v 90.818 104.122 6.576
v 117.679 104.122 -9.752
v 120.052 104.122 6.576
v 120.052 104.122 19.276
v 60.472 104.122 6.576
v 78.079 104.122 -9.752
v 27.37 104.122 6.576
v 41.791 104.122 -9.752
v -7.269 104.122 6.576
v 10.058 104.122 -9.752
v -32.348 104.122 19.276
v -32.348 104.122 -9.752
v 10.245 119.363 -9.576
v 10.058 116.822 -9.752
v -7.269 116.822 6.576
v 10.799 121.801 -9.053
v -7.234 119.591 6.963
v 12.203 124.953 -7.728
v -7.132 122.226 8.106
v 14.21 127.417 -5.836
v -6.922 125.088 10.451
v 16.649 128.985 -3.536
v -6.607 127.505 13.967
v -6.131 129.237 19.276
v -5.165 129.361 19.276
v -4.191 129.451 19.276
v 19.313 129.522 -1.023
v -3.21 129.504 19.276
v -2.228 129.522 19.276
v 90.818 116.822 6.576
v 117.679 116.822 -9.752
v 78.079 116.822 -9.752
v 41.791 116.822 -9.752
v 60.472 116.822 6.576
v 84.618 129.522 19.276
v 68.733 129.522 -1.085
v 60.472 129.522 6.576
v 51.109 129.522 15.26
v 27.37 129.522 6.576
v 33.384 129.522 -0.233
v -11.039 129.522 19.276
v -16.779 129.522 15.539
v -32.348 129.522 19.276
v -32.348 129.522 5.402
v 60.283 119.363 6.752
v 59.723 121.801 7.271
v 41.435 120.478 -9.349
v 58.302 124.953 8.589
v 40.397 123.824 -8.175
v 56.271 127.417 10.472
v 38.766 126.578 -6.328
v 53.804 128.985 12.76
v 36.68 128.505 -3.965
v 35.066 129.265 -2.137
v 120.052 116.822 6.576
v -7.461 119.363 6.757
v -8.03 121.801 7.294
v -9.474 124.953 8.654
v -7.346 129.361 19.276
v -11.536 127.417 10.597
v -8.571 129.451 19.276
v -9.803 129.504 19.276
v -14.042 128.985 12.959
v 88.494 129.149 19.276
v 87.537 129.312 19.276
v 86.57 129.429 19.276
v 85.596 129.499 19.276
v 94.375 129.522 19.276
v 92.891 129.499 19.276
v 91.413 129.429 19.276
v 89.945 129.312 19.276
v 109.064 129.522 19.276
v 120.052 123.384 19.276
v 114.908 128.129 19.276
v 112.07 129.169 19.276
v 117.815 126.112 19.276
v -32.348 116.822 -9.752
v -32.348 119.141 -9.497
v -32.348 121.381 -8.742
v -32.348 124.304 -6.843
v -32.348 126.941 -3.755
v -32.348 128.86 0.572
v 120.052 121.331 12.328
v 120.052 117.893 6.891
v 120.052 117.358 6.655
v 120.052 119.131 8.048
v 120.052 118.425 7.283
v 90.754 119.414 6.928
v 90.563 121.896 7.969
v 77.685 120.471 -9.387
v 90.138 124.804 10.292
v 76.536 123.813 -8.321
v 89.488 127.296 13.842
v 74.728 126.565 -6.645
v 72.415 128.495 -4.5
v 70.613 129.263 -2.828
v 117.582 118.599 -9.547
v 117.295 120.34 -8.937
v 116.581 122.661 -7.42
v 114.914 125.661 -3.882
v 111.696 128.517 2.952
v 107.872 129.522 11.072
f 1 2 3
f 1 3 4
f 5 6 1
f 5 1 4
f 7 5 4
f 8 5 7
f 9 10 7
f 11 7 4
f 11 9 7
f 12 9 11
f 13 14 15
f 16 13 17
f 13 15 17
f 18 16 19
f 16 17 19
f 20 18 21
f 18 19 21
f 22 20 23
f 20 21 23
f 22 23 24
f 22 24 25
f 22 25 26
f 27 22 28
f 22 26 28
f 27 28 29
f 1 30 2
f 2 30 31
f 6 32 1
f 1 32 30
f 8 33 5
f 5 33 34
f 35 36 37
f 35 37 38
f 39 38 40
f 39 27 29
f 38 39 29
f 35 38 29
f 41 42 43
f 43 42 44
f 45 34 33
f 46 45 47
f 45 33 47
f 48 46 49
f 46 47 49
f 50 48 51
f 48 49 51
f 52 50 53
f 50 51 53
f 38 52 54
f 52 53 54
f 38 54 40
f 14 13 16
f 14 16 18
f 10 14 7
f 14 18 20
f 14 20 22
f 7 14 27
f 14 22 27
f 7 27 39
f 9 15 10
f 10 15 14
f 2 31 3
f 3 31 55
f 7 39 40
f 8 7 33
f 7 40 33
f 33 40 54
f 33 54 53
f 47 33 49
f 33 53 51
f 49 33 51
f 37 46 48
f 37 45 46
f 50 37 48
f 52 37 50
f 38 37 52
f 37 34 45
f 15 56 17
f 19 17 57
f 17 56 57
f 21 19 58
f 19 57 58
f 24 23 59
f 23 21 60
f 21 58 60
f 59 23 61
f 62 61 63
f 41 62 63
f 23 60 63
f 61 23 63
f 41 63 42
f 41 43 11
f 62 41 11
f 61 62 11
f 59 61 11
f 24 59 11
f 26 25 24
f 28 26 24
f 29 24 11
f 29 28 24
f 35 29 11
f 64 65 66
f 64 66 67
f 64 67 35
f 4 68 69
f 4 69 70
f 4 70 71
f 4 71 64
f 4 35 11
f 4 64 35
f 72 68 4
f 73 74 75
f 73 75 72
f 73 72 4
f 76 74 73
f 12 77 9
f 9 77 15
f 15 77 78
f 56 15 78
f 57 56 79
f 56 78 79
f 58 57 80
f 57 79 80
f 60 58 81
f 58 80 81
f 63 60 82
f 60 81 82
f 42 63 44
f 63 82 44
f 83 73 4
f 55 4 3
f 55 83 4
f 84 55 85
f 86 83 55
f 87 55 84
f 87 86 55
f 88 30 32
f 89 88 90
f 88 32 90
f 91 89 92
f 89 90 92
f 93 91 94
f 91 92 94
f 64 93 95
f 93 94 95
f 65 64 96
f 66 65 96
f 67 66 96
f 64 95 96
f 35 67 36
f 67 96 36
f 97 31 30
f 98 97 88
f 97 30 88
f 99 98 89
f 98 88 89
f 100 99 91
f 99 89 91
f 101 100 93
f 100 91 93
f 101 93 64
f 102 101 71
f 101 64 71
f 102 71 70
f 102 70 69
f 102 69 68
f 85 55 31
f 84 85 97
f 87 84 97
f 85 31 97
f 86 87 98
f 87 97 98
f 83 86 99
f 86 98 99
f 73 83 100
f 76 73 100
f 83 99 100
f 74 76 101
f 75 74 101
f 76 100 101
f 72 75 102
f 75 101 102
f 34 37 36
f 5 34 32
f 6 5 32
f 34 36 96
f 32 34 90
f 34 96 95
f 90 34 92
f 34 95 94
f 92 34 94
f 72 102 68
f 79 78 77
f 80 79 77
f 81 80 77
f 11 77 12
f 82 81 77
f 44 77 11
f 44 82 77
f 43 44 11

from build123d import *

# Parameters (mm, degrees)
SKETCH1_W           = 152.4
SKETCH1_H           = 12.7
BOSS_EXTRUDE1_DEPTH = 25.4
BOSS_EXTRUDE2_DEPTH = 25.4
FILLET2_R           = 12.7


with BuildPart() as part:
    # Sketch1 → Boss-Extrude1 (new body)
    with BuildSketch(Plane(origin=(0, 129.522150418, 0), x_dir=(1, 0, 0), z_dir=(0, 1, 0))):
        with Locations((43.851863223, -12.926286206)):
            Rectangle(SKETCH1_W, SKETCH1_H)
    extrude(amount=-BOSS_EXTRUDE1_DEPTH)

    # Sketch2 → Boss-Extrude2 (add)
    with BuildSketch(Plane(origin=(0, 129.522150418, 0), x_dir=(1, 0, 0), z_dir=(0, 1, 0))):
        Polygon((-32.348136777, -6.576286206), (-32.348136777, 9.752049173), (-7.268775287, -6.576286206), (10.057684935, 9.752049173), (27.370150986, -6.576286206), (41.790569064, 9.752049173), (60.472332517, -6.576286206), (78.078963356, 9.752049173), (90.818027749, -6.576286206), (117.678669506, 9.752049173), (120.051863223, -6.576286206), (120.051863223, -10.496577103), (-32.348136777, -10.496577103), align=None)
    extrude(amount=-BOSS_EXTRUDE2_DEPTH)

    # Fillet2
    # the kernel refuses this fillet: 12.7 mm, written as the material it takes off along each edge
    with BuildSketch(Plane(origin=(-58.955745883, 129.522150418, -27.075375577), x_dir=(0, -1, 0), z_dir=(0.8380349324532734, 0, 0.5456165796491502))) as fillet2_piece_1_section:
        with BuildLine():
            CenterArc((FILLET2_R, -FILLET2_R), FILLET2_R, 90, 90)
            Line((0, -FILLET2_R), (0, 0))
            Line((0, 0), (FILLET2_R, 0))
        make_face()
    fillet2_piece_1 = extrude(amount=93.426391514, mode=Mode.PRIVATE)
    fillet2_piece_1 = split(fillet2_piece_1, bisect_by=Plane(origin=(-14.62978652, 126.629320204, 13.5132519), z_dir=(-0.6858340421816573, 0, -0.7277579725326055)), keep=Keep.TOP, mode=Mode.PRIVATE)
    add(fillet2_piece_1, mode=Mode.SUBTRACT)
    with BuildSketch(Plane(origin=(-30.375090914, 129.522150418, 28.351517045), x_dir=(0, -1, 0), z_dir=(0.7277579725326055, 0, -0.6858340421816573))) as fillet2_piece_2_section:
        with BuildLine():
            CenterArc((FILLET2_R, -FILLET2_R), FILLET2_R, 90, 90)
            Line((0, -FILLET2_R), (0, 0))
            Line((0, 0), (FILLET2_R, 0))
        make_face()
    fillet2_piece_2 = extrude(amount=87.307997817, mode=Mode.PRIVATE)
    fillet2_piece_2 = split(fillet2_piece_2, bisect_by=Plane(origin=(0.600633599, 126.627355979, 11.699795733), z_dir=(0.5456165796491502, 0, -0.8380349324532734)), keep=Keep.TOP, mode=Mode.PRIVATE)
    add(fillet2_piece_2, mode=Mode.SUBTRACT)
    with BuildSketch(Plane(origin=(113.112040831, 129.522150418, -41.171921906), x_dir=(0, -1, 0), z_dir=(0.14383082440379222, 0, 0.9896022907973312))) as fillet2_piece_3:
        with BuildLine():
            CenterArc((FILLET2_R, -FILLET2_R), FILLET2_R, 90, 90)
            Line((0, -FILLET2_R), (0, 0))
            Line((0, 0), (FILLET2_R, 0))
        make_face()
    extrude(amount=79.999896505, mode=Mode.SUBTRACT)
    with BuildSketch(Plane(origin=(63.687529345, 129.522150418, 23.068664941), x_dir=(0, -1, 0), z_dir=(0.8545038867379449, 0, -0.5194449995425362))) as fillet2_piece_4_section:
        with BuildLine():
            CenterArc((FILLET2_R, -FILLET2_R), FILLET2_R, 90, 90)
            Line((0, -FILLET2_R), (0, 0))
            Line((0, 0), (FILLET2_R, 0))
        make_face()
    fillet2_piece_4 = extrude(amount=94.934194945, mode=Mode.PRIVATE)
    fillet2_piece_4 = split(fillet2_piece_4, bisect_by=Plane(origin=(94.83379058, 126.638697733, 11.723502696), z_dir=(0.7884329224399922, 0, -0.61512074165381)), keep=Keep.TOP, mode=Mode.PRIVATE)
    add(fillet2_piece_4, mode=Mode.SUBTRACT)
    with BuildSketch(Plane(origin=(58.548879808, 129.522150418, -34.784794461), x_dir=(0, -1, 0), z_dir=(0.61512074165381, 0, 0.7884329224399922))) as fillet2_piece_5_section:
        with BuildLine():
            CenterArc((FILLET2_R, -FILLET2_R), FILLET2_R, 90, 90)
            Line((0, -FILLET2_R), (0, 0))
            Line((0, 0), (FILLET2_R, 0))
        make_face()
    fillet2_piece_5 = extrude(amount=84.209859919, mode=Mode.PRIVATE)
    fillet2_piece_5 = split(fillet2_piece_5, bisect_by=Plane(origin=(85.773780616, 126.63700346, 9.642637325), z_dir=(-0.5194449995425363, 0, -0.8545038867379451)), keep=Keep.TOP, mode=Mode.PRIVATE)
    add(fillet2_piece_5, mode=Mode.SUBTRACT)
    with BuildSketch(Plane(origin=(17.884716168, 129.522150418, -30.646371305), x_dir=(0, -1, 0), z_dir=(0.7529402486677585, 0, 0.6580888860451405))) as fillet2_piece_6_section:
        with BuildLine():
            CenterArc((FILLET2_R, -FILLET2_R), FILLET2_R, 90, 90)
            Line((0, -FILLET2_R), (0, 0))
            Line((0, 0), (FILLET2_R, 0))
        make_face()
    fillet2_piece_6 = extrude(amount=88.311747661, mode=Mode.PRIVATE)
    fillet2_piece_6 = split(fillet2_piece_6, bisect_by=Plane(origin=(56.205808832, 126.638654996, 10.533047171), z_dir=(-0.6799885276956249, 0, -0.7332227507397301)), keep=Keep.TOP, mode=Mode.PRIVATE)
    add(fillet2_piece_6, mode=Mode.SUBTRACT)
    with BuildSketch(Plane(origin=(-58.955745883, 129.522150418, -27.075375577), x_dir=(0, -1, 0), z_dir=(0.8380349324532734, 0, 0.5456165796491502))) as fillet2_piece_7a_section:
        with BuildLine():
            CenterArc((FILLET2_R, -FILLET2_R), FILLET2_R, 90, 90)
            Line((0, -FILLET2_R), (0, 0))
            Line((0, 0), (FILLET2_R, 0))
        make_face()
    fillet2_piece_7a = extrude(amount=93.426391514, mode=Mode.PRIVATE)
    fillet2_piece_7a = split(fillet2_piece_7a, bisect_by=Plane(origin=(-6.679987246, 126.680031692, 6.021416459), z_dir=(0.6858340421816573, 0, 0.7277579725326055)), keep=Keep.TOP, mode=Mode.PRIVATE)
    with BuildSketch(Plane(origin=(-30.375090914, 129.522150418, 28.351517045), x_dir=(0, -1, 0), z_dir=(0.7277579725326055, 0, -0.6858340421816573))) as fillet2_piece_7b_section:
        with BuildLine():
            CenterArc((FILLET2_R, -FILLET2_R), FILLET2_R, 90, 90)
            Line((0, -FILLET2_R), (0, 0))
            Line((0, 0), (FILLET2_R, 0))
        make_face()
    fillet2_piece_7b = extrude(amount=87.307997817, mode=Mode.PRIVATE)
    fillet2_piece_7b = split(fillet2_piece_7b, bisect_by=Plane(origin=(-7.946782213, 126.680031692, 6.134858521), z_dir=(-0.5456165796491502, 0, 0.8380349324532734)), keep=Keep.TOP, mode=Mode.PRIVATE)
    fillet2_piece_7 = fillet2_piece_7a & fillet2_piece_7b
    add(fillet2_piece_7, mode=Mode.SUBTRACT)
    with BuildSketch(Plane(origin=(58.548879808, 129.522150418, -34.784794461), x_dir=(0, -1, 0), z_dir=(0.61512074165381, 0, 0.7884329224399922))) as fillet2_piece_8a_section:
        with BuildLine():
            CenterArc((FILLET2_R, -FILLET2_R), FILLET2_R, 90, 90)
            Line((0, -FILLET2_R), (0, 0))
            Line((0, 0), (FILLET2_R, 0))
        make_face()
    fillet2_piece_8a = extrude(amount=84.209859919, mode=Mode.PRIVATE)
    fillet2_piece_8a = split(fillet2_piece_8a, bisect_by=Plane(origin=(89.912348573, 126.663062173, 7.126840189), z_dir=(0.5194449995425363, 0, 0.8545038867379451)), keep=Keep.TOP, mode=Mode.PRIVATE)
    with BuildSketch(Plane(origin=(63.687529345, 129.522150418, 23.068664941), x_dir=(0, -1, 0), z_dir=(0.8545038867379449, 0, -0.5194449995425362))) as fillet2_piece_8b_section:
        with BuildLine():
            CenterArc((FILLET2_R, -FILLET2_R), FILLET2_R, 90, 90)
            Line((0, -FILLET2_R), (0, 0))
            Line((0, 0), (FILLET2_R, 0))
        make_face()
    fillet2_piece_8b = extrude(amount=94.934194945, mode=Mode.PRIVATE)
    fillet2_piece_8b = split(fillet2_piece_8b, bisect_by=Plane(origin=(91.469987388, 126.663062173, 7.4119375), z_dir=(-0.7884329224399922, 0, 0.61512074165381)), keep=Keep.TOP, mode=Mode.PRIVATE)
    fillet2_piece_8 = fillet2_piece_8a & fillet2_piece_8b
    add(fillet2_piece_8, mode=Mode.SUBTRACT)


solid = part.part
